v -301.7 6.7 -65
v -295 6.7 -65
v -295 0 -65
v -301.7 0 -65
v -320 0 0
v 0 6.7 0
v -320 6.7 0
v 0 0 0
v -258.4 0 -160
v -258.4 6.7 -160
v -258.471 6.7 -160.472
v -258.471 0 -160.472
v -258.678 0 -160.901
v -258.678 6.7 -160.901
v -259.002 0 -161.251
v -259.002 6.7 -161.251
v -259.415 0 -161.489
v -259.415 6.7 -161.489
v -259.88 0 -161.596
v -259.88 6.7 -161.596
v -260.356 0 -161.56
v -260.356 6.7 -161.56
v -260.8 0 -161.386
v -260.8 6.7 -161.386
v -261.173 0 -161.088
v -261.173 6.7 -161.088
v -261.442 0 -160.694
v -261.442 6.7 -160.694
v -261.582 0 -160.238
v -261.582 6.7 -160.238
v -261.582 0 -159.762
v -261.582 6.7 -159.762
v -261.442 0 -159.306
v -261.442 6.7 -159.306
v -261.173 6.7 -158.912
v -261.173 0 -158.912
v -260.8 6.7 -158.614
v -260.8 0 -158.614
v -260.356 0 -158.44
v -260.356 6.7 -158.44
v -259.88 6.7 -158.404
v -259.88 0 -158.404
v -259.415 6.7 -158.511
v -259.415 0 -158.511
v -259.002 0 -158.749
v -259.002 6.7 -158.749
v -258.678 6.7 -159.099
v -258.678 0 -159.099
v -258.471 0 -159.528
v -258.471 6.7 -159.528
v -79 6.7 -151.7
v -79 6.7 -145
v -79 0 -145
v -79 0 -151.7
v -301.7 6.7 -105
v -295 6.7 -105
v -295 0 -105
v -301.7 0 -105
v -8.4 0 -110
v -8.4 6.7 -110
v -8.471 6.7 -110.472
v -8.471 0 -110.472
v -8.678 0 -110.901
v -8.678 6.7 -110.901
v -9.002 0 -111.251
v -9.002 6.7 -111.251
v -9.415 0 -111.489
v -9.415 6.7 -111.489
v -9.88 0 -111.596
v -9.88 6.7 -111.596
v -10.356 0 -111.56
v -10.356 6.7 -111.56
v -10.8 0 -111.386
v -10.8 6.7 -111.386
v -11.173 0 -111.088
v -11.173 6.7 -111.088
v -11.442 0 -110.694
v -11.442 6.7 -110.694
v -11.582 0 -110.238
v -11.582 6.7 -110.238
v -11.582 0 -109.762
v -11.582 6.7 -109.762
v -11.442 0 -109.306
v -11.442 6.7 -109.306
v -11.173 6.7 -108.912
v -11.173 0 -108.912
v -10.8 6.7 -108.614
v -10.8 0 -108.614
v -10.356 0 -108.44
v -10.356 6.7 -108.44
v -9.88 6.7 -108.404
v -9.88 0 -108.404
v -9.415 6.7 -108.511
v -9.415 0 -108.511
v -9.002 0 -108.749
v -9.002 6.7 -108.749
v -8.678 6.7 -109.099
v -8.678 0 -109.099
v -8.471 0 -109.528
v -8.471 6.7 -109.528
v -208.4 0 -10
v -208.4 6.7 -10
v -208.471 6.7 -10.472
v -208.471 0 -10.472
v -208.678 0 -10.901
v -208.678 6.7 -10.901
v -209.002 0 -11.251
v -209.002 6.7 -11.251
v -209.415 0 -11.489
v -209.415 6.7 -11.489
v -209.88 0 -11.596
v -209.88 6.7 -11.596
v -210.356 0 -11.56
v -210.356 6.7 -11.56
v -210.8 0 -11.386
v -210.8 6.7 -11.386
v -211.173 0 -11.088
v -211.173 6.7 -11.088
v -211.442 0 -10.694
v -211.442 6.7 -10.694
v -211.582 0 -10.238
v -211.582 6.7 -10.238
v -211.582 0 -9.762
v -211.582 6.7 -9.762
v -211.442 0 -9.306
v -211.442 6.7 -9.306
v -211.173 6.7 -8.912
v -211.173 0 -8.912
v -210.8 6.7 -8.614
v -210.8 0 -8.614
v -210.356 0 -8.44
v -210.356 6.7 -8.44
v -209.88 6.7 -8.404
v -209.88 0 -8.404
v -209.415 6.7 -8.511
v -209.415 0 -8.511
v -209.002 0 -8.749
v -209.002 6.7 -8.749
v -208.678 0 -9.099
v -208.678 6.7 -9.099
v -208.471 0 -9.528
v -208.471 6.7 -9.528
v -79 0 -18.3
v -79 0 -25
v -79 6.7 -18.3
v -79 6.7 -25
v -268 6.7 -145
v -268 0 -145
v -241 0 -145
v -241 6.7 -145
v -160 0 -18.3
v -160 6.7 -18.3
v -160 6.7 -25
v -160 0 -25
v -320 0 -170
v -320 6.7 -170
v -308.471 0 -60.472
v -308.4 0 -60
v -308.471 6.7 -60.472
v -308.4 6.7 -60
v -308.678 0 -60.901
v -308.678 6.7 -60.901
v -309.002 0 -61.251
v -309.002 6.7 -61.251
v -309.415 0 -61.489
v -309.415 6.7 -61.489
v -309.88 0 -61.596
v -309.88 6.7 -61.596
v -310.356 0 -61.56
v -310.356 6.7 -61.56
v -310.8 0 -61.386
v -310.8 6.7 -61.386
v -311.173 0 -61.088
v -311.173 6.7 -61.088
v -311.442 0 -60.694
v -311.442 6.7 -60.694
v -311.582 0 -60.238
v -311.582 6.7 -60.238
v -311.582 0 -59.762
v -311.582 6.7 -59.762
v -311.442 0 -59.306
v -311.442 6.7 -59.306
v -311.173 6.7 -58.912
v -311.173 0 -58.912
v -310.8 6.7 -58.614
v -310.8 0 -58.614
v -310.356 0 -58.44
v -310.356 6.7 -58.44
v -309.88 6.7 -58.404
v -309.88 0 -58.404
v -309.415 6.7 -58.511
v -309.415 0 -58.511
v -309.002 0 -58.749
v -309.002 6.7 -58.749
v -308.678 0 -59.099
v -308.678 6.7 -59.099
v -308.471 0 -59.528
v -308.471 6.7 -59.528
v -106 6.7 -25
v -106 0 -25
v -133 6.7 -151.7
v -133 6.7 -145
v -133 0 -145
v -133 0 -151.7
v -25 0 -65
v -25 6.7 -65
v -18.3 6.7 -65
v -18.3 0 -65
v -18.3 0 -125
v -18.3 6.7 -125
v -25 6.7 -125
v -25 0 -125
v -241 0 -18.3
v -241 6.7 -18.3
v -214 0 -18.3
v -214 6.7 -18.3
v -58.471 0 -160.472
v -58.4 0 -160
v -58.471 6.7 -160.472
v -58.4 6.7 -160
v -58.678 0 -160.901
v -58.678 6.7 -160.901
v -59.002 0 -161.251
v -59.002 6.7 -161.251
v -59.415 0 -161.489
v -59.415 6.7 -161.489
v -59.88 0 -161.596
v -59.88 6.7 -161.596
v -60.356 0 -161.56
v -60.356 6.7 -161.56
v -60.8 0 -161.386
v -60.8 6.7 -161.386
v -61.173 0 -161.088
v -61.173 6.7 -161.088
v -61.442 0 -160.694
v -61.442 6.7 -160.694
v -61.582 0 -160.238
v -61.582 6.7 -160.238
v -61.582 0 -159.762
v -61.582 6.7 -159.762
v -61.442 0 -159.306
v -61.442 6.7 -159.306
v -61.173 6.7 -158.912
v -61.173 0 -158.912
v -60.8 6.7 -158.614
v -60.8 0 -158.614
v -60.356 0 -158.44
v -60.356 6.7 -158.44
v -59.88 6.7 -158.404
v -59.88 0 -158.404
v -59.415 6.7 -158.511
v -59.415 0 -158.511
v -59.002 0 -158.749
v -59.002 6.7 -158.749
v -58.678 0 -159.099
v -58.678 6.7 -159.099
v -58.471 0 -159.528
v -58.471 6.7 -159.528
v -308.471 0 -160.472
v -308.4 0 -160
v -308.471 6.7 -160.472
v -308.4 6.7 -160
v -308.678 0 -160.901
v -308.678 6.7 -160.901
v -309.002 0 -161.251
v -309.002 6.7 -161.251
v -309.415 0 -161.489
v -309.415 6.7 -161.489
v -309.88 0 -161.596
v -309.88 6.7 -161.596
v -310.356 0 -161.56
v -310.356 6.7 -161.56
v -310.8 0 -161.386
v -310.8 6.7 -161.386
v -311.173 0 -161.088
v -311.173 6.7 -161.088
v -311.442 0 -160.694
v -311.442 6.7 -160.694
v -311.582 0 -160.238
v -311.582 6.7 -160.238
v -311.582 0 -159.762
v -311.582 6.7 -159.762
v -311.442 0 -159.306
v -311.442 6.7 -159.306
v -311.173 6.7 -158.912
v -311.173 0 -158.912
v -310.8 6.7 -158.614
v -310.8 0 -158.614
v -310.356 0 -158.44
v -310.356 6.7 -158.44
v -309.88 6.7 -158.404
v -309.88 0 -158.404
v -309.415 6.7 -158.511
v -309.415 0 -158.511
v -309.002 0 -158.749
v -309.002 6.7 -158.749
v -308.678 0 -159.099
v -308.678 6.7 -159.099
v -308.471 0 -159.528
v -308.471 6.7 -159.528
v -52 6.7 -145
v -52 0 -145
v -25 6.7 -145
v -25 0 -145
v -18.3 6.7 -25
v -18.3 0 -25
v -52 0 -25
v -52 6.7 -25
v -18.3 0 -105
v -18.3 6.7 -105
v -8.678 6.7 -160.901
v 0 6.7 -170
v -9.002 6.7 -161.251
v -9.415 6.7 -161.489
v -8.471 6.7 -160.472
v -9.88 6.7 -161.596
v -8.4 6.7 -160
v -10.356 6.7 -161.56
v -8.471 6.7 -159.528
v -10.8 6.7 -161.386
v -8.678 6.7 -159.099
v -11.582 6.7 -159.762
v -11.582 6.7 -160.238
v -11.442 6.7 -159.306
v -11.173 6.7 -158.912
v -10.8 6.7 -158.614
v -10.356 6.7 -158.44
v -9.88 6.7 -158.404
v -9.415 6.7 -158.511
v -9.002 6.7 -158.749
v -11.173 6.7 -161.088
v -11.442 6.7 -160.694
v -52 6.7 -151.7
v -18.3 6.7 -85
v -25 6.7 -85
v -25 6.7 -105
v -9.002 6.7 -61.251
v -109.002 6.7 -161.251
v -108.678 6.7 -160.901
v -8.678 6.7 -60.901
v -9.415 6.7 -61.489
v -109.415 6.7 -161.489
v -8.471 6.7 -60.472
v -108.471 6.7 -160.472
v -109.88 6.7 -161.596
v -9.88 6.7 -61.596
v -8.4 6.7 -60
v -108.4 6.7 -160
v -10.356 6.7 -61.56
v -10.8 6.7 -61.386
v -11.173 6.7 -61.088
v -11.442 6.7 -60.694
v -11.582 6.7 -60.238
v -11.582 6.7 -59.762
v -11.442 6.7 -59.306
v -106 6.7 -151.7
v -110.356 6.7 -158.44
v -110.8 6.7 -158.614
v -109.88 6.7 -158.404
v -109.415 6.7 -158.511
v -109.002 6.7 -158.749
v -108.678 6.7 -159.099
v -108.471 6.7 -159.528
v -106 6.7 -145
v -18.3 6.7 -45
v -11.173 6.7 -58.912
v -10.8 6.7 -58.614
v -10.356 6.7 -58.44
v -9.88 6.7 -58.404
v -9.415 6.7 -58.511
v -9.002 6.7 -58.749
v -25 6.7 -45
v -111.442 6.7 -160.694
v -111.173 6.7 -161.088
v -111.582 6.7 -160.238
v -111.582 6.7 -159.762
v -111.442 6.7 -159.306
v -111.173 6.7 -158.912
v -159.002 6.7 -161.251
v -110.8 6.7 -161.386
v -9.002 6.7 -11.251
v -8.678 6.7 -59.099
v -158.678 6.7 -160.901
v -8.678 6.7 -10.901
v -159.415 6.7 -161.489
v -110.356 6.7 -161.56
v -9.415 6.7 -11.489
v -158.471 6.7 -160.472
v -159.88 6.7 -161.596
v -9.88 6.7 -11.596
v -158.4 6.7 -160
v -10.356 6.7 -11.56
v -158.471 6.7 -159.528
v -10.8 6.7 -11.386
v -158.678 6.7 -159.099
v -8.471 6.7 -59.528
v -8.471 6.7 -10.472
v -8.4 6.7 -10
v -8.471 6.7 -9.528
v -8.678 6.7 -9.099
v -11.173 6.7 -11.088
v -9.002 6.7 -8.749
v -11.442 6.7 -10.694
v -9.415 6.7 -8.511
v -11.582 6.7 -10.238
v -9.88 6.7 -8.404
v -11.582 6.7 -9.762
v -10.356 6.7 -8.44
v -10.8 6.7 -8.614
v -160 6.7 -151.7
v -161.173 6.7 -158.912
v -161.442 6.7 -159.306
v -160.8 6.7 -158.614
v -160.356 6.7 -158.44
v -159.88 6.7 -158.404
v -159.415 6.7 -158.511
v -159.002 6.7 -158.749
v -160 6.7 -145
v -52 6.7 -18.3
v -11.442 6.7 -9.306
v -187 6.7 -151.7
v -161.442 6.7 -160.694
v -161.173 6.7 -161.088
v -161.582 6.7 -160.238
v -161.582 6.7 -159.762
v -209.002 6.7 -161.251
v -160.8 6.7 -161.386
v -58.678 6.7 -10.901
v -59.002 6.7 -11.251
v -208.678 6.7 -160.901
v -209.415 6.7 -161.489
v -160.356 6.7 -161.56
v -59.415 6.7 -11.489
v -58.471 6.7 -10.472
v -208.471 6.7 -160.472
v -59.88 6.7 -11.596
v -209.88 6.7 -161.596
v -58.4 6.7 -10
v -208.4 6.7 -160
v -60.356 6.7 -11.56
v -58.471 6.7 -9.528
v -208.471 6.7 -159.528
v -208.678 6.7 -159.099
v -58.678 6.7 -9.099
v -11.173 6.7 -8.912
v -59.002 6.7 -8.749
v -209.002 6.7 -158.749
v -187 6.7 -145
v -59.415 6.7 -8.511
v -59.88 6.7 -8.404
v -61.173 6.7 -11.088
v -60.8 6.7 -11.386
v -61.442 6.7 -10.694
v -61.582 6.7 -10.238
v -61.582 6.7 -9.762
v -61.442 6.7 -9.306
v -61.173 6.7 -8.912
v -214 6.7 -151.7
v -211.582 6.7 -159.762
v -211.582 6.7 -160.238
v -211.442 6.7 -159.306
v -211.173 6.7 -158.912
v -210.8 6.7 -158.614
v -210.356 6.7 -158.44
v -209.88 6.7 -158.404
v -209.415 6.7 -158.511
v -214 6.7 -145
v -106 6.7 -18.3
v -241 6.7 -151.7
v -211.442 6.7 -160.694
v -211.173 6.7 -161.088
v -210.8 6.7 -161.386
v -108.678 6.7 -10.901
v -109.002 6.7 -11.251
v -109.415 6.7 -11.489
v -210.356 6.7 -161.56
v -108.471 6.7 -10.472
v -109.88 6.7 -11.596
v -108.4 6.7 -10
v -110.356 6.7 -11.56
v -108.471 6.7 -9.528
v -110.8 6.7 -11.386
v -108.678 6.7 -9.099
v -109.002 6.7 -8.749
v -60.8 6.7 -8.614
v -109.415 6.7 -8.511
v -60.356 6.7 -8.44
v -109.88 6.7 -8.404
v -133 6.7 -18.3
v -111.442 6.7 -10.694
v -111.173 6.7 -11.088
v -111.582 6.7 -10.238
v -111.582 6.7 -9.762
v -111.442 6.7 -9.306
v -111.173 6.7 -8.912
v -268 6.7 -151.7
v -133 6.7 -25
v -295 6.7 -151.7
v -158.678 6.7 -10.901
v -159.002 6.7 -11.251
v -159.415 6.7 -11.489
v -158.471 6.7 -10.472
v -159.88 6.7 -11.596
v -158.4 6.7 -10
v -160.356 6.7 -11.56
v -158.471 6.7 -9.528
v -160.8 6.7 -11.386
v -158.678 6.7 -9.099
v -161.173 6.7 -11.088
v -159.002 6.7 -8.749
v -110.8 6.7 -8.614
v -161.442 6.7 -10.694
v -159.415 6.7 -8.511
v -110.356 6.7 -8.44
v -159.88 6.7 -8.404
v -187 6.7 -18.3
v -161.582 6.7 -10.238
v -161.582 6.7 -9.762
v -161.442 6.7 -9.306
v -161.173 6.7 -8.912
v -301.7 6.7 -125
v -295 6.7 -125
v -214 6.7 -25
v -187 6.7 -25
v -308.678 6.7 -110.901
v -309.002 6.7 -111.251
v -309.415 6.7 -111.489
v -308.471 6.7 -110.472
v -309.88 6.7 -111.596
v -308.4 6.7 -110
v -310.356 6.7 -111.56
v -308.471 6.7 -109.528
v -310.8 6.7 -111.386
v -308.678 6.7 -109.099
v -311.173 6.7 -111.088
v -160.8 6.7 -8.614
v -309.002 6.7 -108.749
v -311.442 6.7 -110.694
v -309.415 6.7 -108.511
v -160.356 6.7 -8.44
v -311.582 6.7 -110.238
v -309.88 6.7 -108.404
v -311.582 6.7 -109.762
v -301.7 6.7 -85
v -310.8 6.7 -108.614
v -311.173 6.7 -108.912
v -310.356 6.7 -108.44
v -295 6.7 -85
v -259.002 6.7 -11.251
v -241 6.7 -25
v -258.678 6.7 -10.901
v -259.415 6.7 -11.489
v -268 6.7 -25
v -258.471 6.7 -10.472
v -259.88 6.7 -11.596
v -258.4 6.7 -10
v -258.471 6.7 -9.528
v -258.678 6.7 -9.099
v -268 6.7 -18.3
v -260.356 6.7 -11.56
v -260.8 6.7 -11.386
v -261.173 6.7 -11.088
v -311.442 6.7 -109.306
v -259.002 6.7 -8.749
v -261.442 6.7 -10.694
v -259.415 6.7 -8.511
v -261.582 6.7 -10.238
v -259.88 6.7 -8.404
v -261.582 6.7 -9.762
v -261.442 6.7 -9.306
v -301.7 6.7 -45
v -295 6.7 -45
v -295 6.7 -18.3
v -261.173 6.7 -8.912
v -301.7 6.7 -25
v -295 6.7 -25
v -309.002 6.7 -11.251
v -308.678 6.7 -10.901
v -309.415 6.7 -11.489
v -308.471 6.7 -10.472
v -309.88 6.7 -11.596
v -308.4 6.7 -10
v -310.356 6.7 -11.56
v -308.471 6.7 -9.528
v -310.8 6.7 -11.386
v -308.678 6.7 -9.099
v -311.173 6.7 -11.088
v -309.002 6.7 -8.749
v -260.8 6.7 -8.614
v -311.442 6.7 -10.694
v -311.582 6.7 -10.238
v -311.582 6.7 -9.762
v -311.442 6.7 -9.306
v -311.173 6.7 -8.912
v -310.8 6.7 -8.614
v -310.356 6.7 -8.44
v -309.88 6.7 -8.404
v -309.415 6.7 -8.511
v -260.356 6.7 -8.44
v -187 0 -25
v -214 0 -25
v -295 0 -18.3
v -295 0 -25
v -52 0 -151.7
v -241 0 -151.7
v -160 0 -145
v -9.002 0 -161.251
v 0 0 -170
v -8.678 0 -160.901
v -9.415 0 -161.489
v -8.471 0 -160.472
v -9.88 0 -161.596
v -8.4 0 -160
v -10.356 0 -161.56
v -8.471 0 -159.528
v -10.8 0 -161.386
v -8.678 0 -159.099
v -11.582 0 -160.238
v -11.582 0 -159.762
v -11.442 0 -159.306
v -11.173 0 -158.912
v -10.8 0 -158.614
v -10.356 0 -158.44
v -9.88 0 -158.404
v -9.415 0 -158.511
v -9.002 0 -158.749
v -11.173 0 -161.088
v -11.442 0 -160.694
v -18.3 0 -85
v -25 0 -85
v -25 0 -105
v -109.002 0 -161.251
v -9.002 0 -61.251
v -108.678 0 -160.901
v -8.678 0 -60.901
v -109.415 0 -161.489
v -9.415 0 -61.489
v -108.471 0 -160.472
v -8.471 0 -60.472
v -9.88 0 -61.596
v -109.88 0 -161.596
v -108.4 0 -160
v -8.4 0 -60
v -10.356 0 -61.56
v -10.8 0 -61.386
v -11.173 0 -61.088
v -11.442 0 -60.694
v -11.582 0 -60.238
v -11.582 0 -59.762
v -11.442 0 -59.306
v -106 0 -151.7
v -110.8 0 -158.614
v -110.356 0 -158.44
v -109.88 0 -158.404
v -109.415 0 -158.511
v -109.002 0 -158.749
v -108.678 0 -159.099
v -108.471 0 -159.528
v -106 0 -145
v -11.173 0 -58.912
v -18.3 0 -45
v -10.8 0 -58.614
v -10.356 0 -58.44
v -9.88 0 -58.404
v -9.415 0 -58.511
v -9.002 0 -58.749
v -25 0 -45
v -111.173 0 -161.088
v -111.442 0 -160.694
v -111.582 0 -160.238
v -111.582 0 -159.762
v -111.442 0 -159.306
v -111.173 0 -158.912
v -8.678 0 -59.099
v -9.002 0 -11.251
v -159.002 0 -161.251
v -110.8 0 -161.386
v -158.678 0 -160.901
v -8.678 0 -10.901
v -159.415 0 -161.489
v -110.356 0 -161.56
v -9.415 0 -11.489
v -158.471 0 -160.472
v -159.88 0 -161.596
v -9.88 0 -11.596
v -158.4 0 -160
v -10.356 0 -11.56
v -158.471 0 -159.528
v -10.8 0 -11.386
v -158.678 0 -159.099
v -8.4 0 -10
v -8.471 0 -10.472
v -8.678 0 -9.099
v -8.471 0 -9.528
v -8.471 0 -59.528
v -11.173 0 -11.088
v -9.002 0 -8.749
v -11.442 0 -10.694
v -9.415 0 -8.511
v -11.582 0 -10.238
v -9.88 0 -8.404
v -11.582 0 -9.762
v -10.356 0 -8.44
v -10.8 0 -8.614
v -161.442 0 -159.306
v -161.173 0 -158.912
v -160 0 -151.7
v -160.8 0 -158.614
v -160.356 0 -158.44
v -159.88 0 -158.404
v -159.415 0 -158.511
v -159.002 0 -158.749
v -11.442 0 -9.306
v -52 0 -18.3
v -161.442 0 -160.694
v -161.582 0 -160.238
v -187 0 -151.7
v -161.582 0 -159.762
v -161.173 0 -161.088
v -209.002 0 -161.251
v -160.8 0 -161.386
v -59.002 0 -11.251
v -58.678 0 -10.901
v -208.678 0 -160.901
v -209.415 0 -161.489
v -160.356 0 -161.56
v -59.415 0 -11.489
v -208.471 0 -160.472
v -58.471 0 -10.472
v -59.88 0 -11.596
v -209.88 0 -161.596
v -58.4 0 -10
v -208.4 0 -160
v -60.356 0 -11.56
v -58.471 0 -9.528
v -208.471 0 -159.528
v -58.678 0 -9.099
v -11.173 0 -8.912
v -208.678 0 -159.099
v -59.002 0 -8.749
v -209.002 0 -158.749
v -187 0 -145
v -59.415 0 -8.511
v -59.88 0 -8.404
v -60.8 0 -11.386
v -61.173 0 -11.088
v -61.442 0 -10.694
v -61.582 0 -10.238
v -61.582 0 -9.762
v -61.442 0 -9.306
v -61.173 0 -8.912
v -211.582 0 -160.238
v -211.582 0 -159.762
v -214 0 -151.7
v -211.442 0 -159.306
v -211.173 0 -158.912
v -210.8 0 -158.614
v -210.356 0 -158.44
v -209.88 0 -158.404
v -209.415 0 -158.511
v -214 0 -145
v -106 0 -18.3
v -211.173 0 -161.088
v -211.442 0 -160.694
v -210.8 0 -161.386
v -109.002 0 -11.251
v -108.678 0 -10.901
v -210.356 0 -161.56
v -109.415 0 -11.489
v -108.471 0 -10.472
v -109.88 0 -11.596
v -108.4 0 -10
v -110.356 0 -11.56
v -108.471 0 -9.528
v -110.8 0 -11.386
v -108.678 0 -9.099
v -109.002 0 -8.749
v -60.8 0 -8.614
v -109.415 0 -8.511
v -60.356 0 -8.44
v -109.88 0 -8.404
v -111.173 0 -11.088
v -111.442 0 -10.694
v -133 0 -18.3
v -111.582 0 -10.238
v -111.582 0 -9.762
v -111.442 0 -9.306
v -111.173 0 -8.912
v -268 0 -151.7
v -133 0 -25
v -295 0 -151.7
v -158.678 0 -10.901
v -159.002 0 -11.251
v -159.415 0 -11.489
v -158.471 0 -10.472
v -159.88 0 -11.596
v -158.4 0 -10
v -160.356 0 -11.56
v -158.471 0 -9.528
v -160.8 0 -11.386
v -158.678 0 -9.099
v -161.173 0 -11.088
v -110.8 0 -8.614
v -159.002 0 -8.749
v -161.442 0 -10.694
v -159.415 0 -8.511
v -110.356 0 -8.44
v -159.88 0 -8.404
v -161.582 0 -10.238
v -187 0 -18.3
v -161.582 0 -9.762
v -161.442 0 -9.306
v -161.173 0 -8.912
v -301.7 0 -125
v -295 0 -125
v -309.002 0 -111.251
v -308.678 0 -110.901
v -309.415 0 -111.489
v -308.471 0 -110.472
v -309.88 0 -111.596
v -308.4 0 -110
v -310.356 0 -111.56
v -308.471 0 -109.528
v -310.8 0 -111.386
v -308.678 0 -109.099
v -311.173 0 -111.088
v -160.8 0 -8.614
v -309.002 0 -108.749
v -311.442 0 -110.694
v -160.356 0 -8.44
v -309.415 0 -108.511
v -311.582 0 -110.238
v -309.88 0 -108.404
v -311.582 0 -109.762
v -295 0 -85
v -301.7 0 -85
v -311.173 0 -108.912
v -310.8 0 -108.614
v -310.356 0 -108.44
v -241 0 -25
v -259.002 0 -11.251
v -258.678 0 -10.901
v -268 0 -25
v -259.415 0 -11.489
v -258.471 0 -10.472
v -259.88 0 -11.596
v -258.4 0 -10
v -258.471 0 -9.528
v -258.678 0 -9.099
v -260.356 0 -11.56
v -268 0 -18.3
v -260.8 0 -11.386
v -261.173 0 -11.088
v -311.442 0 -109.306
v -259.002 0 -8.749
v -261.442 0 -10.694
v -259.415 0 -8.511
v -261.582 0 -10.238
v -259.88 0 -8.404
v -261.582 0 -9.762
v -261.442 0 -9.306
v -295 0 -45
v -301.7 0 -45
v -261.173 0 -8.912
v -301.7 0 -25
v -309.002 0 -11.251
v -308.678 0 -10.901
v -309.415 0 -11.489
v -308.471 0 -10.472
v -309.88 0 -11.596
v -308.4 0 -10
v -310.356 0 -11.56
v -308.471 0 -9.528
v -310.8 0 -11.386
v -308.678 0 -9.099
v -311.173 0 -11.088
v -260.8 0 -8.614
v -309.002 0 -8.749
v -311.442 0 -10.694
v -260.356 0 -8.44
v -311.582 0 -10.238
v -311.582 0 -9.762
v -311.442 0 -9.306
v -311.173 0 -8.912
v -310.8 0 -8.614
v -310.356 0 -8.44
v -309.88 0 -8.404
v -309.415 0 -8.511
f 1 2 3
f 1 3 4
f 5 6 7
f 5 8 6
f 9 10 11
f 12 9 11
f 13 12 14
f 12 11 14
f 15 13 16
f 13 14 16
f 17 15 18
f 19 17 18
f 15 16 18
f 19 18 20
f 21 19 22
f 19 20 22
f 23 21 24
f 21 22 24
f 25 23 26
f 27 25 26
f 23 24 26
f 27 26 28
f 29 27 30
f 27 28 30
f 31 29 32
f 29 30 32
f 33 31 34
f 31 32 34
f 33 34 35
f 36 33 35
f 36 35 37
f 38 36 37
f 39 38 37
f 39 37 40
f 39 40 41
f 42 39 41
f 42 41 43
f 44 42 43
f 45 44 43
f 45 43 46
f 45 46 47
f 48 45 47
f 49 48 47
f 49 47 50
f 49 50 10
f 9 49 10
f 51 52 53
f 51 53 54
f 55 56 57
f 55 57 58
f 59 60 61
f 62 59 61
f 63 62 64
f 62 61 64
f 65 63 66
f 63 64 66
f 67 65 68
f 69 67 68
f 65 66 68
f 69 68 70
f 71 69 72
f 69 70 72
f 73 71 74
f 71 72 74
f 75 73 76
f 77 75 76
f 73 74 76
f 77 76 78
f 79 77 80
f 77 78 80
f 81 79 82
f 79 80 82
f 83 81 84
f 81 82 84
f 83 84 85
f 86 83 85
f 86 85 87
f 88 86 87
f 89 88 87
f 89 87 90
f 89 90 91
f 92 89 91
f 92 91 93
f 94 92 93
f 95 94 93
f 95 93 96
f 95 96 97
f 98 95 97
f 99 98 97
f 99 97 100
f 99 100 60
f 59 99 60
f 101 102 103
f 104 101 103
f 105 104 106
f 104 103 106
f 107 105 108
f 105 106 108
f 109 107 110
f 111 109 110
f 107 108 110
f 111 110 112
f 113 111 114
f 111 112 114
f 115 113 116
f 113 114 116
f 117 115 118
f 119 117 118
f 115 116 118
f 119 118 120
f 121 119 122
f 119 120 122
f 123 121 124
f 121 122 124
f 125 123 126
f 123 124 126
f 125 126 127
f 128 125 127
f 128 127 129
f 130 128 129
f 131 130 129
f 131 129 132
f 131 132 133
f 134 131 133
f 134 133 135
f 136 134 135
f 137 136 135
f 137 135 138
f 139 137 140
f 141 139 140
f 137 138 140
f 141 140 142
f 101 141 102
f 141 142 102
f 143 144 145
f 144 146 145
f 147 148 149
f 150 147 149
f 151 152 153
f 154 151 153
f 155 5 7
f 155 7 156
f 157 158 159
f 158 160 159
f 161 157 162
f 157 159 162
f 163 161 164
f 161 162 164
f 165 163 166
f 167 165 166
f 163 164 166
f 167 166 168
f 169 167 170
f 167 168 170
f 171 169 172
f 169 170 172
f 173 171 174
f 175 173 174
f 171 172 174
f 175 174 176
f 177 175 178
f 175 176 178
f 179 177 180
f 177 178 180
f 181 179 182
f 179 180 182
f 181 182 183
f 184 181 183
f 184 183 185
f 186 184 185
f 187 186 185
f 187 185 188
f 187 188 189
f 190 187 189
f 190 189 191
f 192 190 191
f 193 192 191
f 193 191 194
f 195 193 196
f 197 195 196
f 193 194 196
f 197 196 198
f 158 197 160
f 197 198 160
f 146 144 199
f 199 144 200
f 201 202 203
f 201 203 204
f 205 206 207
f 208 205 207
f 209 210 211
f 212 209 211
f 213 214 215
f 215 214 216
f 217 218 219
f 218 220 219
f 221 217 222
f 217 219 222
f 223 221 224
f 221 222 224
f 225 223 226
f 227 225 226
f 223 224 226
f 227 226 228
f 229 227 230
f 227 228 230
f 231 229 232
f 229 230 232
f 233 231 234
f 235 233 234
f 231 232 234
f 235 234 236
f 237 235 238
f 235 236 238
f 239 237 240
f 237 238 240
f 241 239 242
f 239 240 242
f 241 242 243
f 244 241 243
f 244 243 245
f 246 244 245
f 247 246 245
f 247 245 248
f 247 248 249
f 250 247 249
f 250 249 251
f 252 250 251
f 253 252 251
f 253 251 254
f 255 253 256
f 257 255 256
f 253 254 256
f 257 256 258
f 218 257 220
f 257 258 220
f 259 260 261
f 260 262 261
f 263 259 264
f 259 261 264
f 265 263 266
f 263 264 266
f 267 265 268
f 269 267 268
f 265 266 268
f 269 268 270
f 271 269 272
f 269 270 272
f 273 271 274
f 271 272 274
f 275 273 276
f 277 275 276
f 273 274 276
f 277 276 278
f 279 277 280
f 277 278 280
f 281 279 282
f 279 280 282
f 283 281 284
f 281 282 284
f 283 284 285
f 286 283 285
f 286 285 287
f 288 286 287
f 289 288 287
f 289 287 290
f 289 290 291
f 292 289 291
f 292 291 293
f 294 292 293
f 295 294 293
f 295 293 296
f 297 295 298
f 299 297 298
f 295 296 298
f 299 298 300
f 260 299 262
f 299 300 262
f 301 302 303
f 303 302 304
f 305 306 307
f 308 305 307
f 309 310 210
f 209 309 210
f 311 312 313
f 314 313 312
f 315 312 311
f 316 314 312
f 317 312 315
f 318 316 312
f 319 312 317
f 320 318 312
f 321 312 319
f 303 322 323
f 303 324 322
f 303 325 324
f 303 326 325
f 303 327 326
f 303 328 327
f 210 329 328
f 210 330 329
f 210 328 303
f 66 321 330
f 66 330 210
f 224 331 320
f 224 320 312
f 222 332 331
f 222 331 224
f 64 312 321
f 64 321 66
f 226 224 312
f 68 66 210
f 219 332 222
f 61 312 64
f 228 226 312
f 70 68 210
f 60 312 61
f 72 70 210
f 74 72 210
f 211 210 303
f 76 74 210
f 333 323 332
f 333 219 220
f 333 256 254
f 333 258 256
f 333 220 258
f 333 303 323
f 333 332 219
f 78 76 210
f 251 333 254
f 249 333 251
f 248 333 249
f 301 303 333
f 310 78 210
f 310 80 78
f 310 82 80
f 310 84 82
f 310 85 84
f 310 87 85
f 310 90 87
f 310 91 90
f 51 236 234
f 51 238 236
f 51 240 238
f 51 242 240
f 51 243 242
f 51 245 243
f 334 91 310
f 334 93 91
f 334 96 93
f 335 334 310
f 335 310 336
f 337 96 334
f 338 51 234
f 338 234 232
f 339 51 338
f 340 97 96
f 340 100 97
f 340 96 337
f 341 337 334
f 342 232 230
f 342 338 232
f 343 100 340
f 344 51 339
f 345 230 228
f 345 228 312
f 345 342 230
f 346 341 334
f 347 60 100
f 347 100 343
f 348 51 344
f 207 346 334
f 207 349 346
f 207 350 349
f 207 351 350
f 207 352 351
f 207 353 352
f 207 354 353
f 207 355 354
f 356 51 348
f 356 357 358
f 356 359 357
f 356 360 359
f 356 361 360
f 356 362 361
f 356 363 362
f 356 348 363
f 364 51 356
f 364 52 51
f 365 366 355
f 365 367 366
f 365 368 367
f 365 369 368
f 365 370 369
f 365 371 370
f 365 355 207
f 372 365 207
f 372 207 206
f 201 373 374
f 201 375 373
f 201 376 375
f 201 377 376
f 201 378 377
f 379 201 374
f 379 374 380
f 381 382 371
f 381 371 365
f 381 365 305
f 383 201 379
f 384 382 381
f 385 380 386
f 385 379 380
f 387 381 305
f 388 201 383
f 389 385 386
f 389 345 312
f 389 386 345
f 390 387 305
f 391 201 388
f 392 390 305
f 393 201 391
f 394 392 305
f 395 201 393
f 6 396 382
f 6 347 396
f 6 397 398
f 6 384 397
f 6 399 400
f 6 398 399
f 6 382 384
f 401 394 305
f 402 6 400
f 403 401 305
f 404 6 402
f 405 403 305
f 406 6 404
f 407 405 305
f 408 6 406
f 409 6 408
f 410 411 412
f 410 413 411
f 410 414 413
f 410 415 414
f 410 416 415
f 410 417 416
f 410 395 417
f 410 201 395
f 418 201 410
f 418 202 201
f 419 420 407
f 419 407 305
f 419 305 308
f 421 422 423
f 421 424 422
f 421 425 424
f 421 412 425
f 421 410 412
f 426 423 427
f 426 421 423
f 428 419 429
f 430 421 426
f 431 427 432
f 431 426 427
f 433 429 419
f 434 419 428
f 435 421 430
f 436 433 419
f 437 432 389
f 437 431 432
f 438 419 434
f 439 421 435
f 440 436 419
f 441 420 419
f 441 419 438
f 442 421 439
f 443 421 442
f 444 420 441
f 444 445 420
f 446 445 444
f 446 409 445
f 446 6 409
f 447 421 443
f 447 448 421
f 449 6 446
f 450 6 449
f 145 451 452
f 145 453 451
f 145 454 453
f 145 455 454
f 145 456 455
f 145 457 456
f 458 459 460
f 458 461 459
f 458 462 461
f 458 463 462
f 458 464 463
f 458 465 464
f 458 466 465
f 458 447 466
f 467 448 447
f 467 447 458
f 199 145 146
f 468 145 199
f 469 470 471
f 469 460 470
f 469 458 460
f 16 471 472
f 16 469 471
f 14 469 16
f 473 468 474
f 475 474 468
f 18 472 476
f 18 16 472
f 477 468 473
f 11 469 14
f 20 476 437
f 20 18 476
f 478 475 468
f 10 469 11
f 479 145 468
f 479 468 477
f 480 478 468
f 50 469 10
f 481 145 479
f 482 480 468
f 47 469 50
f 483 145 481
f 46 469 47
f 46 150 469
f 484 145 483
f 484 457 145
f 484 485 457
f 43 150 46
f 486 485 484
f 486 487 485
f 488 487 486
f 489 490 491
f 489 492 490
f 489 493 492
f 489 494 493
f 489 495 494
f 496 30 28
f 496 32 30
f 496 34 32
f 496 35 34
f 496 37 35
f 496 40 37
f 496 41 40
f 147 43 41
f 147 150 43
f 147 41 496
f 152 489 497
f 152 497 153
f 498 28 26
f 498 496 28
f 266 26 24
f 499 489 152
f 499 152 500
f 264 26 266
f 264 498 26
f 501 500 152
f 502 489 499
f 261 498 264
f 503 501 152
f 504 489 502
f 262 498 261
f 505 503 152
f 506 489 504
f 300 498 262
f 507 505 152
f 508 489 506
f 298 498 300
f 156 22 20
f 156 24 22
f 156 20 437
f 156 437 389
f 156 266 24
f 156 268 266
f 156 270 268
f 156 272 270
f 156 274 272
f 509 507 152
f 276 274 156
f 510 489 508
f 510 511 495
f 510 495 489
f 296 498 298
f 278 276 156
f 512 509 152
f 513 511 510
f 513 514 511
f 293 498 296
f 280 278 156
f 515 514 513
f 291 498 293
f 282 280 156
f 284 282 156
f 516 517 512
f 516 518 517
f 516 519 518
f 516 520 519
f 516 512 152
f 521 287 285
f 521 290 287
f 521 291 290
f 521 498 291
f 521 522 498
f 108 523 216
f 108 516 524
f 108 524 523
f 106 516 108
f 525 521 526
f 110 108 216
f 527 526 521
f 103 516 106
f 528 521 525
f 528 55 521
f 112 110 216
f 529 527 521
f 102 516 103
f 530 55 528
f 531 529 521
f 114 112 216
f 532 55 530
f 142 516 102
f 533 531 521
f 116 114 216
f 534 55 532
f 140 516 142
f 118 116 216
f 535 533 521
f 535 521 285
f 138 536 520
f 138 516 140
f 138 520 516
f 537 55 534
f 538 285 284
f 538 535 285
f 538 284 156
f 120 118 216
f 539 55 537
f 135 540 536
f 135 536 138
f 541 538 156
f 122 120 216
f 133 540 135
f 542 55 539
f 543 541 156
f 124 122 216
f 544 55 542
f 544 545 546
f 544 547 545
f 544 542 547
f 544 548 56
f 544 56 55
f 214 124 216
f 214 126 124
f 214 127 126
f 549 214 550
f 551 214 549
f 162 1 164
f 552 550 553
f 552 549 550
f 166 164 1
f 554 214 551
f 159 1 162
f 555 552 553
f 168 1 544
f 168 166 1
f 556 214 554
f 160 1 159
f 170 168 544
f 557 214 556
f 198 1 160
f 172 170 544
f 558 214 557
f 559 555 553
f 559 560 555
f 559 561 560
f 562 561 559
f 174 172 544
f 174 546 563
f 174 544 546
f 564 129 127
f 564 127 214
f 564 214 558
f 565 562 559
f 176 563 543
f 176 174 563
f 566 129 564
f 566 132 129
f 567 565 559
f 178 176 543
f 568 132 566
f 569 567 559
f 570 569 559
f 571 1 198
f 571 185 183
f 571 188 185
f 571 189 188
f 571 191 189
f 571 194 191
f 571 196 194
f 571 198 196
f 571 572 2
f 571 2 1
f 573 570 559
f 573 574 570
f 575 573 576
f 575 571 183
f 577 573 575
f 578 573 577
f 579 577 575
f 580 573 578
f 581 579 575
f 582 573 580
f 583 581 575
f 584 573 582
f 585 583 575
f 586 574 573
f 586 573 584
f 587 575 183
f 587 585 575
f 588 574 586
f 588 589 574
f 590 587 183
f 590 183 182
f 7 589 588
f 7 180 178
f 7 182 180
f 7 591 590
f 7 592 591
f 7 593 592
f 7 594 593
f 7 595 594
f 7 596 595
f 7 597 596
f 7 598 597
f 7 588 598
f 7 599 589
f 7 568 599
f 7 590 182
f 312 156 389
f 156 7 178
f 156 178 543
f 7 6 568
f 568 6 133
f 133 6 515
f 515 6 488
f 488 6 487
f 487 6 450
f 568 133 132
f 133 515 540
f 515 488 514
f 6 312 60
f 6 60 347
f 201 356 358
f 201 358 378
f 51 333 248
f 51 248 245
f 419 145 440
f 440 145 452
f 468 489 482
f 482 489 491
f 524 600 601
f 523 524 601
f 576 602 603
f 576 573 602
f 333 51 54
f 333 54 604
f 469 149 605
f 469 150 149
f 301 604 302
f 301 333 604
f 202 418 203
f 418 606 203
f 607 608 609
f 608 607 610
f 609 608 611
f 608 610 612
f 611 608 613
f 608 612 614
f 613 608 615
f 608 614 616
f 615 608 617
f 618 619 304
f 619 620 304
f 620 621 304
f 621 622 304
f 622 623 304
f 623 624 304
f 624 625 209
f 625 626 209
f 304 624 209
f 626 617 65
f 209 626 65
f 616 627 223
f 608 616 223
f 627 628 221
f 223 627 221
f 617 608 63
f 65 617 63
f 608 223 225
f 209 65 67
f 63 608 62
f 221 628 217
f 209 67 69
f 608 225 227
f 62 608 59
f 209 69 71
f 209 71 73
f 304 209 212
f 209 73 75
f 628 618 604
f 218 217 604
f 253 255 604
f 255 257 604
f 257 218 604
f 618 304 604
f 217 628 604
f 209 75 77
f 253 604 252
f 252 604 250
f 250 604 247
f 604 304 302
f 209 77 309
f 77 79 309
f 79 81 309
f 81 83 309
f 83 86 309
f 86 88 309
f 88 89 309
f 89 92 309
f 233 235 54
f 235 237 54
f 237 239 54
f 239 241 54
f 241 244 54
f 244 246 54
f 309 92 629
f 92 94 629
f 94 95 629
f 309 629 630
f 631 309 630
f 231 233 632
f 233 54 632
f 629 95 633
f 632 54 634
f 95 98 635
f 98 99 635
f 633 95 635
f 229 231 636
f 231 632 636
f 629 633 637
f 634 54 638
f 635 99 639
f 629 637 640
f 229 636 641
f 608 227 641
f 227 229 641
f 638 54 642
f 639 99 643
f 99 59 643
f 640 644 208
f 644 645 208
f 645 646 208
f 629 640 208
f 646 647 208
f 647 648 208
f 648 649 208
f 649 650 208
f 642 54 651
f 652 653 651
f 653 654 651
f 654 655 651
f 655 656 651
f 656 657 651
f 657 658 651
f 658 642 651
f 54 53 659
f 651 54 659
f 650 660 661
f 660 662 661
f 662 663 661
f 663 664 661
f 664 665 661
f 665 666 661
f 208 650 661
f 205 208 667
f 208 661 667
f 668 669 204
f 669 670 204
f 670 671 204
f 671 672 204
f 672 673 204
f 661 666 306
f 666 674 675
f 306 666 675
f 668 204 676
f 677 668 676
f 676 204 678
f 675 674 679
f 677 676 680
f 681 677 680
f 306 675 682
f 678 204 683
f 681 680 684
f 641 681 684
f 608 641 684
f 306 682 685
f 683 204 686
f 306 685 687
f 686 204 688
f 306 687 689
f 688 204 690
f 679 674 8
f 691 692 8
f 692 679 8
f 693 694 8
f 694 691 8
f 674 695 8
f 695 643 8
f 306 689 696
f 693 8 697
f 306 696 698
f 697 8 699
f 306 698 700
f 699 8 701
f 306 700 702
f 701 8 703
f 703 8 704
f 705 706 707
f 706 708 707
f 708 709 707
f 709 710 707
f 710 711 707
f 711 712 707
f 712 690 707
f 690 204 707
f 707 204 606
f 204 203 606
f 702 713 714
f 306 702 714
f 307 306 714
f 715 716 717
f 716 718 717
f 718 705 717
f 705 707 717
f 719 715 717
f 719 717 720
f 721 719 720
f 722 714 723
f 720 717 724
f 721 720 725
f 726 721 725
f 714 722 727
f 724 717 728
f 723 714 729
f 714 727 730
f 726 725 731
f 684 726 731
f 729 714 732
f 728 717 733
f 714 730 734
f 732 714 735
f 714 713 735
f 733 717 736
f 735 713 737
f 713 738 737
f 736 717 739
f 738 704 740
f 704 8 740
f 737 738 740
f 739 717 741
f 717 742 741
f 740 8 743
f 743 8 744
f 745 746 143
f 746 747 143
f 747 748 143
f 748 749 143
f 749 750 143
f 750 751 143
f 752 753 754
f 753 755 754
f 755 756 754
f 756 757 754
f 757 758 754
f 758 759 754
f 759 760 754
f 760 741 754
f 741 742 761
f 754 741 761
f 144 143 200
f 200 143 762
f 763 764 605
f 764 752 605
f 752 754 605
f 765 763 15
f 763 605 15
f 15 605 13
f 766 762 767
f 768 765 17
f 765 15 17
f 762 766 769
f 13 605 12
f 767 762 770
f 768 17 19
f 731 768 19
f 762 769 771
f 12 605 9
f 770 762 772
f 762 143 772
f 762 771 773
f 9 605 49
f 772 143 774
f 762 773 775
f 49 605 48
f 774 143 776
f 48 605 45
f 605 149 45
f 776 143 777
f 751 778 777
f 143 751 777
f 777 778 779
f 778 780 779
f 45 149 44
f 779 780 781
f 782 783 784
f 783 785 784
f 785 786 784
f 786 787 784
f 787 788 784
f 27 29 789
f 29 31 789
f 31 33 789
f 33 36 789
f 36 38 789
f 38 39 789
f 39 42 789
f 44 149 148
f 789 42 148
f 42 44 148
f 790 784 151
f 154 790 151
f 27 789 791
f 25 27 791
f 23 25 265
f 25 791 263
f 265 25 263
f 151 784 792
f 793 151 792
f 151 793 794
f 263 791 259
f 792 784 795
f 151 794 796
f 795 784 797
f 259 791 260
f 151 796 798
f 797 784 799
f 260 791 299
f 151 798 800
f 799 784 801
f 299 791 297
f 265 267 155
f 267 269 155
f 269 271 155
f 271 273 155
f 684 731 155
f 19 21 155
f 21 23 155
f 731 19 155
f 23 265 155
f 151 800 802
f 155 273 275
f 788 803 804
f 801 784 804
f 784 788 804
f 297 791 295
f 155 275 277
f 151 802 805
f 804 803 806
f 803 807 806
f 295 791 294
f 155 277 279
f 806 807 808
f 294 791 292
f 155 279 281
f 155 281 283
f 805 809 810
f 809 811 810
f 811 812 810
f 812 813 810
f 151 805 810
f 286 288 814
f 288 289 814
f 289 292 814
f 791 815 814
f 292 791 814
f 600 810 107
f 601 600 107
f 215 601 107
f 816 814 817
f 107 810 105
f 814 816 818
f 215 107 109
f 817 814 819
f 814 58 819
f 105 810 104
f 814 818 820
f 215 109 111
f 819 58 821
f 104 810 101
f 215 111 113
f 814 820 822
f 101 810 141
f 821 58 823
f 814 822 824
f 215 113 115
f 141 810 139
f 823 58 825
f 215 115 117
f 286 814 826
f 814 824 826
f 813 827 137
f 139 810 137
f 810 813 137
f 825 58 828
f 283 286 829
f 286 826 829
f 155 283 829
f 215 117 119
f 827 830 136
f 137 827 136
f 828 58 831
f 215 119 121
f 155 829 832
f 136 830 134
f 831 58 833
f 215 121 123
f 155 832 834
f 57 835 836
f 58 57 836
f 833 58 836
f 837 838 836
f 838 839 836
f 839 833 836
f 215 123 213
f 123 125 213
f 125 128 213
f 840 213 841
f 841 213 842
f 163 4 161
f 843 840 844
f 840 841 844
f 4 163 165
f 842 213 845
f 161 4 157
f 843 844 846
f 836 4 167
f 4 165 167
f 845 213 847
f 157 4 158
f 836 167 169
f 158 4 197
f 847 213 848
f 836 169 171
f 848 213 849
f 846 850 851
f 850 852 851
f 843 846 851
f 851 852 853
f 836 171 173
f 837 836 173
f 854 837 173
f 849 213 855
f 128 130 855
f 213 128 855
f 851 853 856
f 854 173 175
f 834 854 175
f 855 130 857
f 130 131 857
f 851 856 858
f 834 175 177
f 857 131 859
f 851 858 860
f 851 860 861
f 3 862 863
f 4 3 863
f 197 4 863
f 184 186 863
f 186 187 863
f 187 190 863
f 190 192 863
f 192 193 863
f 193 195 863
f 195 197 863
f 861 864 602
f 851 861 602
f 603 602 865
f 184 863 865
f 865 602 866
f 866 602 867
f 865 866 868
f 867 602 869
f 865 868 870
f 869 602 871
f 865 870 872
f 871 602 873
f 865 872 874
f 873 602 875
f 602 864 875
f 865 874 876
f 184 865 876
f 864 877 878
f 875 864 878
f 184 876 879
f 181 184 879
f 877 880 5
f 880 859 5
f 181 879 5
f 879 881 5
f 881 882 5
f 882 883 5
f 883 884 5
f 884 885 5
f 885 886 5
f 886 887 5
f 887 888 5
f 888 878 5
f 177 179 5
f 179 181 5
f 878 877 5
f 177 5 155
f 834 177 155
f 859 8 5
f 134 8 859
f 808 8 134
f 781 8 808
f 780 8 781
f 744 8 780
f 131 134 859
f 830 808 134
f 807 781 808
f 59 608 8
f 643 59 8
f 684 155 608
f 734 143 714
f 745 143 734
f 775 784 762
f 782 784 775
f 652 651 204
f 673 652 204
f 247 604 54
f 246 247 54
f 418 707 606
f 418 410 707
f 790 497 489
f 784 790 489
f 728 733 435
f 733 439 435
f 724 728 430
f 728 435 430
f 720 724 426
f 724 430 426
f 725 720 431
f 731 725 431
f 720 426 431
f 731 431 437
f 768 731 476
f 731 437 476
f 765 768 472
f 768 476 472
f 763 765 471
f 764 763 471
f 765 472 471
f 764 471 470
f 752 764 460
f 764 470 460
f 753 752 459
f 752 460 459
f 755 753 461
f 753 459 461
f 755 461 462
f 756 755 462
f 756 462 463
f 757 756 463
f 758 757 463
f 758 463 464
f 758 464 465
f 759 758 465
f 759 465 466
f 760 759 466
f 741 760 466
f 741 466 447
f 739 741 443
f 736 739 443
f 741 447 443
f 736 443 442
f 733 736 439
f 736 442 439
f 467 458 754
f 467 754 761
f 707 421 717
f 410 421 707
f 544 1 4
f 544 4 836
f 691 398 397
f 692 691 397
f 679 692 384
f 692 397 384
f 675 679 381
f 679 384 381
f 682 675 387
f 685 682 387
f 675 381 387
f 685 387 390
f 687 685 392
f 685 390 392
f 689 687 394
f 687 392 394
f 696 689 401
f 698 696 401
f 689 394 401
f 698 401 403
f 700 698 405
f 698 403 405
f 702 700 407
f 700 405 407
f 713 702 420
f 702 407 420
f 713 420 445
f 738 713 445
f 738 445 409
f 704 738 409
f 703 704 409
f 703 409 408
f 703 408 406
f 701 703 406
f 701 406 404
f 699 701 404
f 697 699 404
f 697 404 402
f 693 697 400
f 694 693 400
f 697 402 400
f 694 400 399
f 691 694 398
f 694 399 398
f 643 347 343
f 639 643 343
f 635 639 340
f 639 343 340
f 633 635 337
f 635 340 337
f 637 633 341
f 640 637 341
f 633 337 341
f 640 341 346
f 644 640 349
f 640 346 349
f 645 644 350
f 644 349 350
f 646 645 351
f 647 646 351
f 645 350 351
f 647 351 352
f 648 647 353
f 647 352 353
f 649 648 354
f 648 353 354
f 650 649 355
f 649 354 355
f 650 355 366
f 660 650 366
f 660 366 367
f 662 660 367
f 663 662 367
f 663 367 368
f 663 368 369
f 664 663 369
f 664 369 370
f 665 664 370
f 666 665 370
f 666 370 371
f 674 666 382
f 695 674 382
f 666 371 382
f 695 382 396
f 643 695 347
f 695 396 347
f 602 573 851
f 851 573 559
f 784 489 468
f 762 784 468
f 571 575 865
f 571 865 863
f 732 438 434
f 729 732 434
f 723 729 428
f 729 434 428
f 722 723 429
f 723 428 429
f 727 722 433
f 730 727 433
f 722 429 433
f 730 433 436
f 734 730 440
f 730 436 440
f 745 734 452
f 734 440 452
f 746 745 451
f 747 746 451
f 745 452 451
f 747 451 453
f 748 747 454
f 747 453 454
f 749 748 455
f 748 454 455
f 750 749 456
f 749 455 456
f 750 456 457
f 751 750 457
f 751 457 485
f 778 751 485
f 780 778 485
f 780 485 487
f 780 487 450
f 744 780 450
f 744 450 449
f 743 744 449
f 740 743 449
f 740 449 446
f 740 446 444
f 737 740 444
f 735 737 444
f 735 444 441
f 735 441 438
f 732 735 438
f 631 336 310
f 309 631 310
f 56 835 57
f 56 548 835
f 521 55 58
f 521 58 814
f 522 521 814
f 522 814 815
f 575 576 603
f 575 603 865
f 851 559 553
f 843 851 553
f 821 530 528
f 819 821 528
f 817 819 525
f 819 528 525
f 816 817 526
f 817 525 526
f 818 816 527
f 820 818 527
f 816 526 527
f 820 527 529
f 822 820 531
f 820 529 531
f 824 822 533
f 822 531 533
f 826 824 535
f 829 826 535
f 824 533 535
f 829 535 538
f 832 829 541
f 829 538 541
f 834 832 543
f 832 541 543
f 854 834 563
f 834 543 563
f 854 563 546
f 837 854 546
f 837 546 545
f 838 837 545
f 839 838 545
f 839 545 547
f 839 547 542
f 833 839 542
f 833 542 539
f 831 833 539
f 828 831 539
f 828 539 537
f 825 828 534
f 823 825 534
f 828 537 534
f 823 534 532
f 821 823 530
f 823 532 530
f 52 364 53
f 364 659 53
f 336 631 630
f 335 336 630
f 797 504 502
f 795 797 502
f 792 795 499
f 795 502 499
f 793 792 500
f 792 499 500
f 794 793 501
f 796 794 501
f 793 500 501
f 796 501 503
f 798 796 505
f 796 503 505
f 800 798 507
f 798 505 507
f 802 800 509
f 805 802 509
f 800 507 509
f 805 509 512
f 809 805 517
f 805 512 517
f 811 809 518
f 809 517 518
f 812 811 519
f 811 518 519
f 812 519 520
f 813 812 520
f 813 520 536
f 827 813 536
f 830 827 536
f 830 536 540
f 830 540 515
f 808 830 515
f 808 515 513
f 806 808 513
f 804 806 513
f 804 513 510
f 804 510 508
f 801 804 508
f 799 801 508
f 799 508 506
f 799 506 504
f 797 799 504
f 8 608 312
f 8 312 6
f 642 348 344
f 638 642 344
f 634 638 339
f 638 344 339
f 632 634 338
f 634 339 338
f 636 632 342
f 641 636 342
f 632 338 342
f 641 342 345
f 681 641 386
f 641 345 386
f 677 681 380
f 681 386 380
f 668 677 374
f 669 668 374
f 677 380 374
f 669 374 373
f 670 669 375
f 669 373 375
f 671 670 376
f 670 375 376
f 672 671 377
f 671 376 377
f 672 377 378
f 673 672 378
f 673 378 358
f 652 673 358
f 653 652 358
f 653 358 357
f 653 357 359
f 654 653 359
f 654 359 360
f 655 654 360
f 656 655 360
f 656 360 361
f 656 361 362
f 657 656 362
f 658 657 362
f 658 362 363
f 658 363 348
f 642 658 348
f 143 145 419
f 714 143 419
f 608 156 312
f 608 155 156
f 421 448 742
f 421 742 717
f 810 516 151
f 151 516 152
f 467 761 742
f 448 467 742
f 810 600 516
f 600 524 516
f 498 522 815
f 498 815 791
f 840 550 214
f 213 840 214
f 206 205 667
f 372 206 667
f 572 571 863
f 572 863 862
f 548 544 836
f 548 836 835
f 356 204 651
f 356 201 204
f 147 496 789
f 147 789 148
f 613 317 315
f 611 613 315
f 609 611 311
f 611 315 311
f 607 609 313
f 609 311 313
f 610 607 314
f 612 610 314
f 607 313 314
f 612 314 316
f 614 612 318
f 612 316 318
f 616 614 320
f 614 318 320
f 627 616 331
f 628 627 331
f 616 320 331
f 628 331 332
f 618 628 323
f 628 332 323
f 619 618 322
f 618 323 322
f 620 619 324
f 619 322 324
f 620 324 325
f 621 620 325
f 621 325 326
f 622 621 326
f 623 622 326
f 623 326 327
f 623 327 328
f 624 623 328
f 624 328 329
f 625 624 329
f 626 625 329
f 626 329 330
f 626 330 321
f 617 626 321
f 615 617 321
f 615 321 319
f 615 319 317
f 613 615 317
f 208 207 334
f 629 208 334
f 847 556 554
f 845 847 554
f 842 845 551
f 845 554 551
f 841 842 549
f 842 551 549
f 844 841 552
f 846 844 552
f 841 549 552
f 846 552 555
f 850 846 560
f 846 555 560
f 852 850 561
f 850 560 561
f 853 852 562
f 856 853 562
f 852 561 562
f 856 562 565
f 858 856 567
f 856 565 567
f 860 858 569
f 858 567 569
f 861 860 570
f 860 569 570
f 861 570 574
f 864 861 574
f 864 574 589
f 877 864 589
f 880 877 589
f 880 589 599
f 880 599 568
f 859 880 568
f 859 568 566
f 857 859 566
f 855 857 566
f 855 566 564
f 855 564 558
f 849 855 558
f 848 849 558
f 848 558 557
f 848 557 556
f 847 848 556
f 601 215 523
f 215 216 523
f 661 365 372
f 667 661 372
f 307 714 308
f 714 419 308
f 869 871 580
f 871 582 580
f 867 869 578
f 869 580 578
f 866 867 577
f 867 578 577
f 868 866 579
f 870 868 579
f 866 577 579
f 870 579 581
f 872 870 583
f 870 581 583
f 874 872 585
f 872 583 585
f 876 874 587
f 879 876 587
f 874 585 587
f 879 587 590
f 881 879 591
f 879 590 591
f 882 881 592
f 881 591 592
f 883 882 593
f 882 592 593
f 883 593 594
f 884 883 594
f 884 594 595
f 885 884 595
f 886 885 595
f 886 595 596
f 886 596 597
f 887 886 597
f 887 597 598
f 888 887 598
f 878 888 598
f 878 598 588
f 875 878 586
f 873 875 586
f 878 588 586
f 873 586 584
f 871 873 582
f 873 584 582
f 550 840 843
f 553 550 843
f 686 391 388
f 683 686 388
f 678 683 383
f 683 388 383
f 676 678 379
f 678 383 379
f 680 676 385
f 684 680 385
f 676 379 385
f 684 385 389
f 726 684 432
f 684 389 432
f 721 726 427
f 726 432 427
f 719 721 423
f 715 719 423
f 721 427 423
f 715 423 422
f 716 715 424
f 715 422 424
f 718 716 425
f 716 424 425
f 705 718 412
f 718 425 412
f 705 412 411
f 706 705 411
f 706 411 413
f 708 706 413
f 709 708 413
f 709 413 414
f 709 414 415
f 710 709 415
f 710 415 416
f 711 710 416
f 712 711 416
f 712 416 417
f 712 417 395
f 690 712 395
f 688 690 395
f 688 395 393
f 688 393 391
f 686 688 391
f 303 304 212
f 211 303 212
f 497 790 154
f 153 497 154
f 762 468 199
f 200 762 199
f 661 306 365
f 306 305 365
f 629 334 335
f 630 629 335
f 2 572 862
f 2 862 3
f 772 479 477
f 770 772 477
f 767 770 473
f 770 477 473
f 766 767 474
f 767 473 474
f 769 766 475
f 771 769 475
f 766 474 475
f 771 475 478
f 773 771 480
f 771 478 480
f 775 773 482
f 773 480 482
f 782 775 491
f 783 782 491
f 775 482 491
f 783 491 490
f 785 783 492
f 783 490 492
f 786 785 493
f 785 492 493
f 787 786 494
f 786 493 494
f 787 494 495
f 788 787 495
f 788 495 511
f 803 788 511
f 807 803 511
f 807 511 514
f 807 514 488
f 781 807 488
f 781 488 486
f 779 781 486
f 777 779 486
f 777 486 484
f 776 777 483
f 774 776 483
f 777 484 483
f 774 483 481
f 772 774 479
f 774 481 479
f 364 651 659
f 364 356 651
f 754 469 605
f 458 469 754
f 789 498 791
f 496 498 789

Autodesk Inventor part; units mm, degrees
ref_plane "YZ Plane" through (0, 0, 0) normal (1, 0, 0) x (0, 1, 0)
ref_plane "XZ Plane" through (0, 0, 0) normal (0, 1, 0) x (-1, 0, 0)
ref_plane "XY Plane" through (0, 0, 0) normal (0, 0, 1) x (1, 0, 0)
sketch "Sketch1" plane through (0, 0, 0) normal (0, 1, 0) x (-1, 0, 0)
  line L0 (0, 0) -> (320, 0)
  line L1 (320, 0) -> (320, -170)
  line L2 (320, -170) -> (0, -170)
  line L3 (0, -170) -> (0, 0)
  line L4 (0, 0) -> (25, 0)
  line L5 (25, -25) -> (295, -25)
  line L6 (295, -25) -> (295, -145)
  line L7 (295, -145) -> (25, -145)
  line L8 (25, -145) -> (25, -25)
  dimension "d0" = 320
  dimension "d1" = 170
  dimension "d2" = 25
  dimension "d3" = 25
  dimension "d4" = 270
  dimension "d5" = 120
extrude "Extrusion1" add sketch "Sketch1" along normal blind 6.7
sketch "Sketch2" plane through (0, 6.7, 0) normal (0, 1, 0) x (1, 0, 0)
  line L0 (-320, 0) -> (0, 0) projected
  line L1 (0, 0) -> (0, 170) projected
  circle A0 centre (-10, 10) radius 1.6
  line L2 (0, 170) -> (0, 160)
  circle A1 centre (-10, 160) radius 1.6
  dimension "d10" = 3.2
  dimension "d13" = 3.2
extrude "Extrusion2" cut sketch "Sketch2" against normal blind 6.7
pattern_linear "Rectangular Pattern1" count 7 spacing 50 along (-1, 0, 0) of "Extrusion2"
sketch "Sketch3" plane through (0, 6.7, 0) normal (0, 1, 0) x (1, 0, 0)
  circle A0 centre (-310, 10) radius 1.6 projected
  circle A1 centre (-310, 60) radius 1.6
  circle A2 centre (-10, 10) radius 1.6 projected
  circle A3 centre (-10, 60) radius 1.6
  point P0 (0, 0)
  dimension "d20" = 3.2
  dimension "d22" = 3.2
extrude "Extrusion3" cut sketch "Sketch3" against normal blind 6.7 contours A1 | A3
pattern_linear "Rectangular Pattern2" count 2 spacing 50 along (0, 0, -1) of "Extrusion3"
sketch "Sketch4" plane through (0, 6.7, 0) normal (0, 1, 0) x (1, 0, 0)
  line L0 (-25, 25) -> (-25, 145) projected
  line L1 (-25, 25) -> (-295, 25) projected
  line L2 (-52, 25) -> (-79, 25)
  line L3 (-79, 25) -> (-79, 18.3)
  line L4 (-79, 18.3) -> (-52, 18.3)
  line L5 (-52, 18.3) -> (-52, 25)
  line L6 (-295, 145) -> (-25, 145) projected
  line L7 (-25, 145) -> (-52, 145)
  line L8 (-52, 145) -> (-79, 145)
  line L9 (-79, 145) -> (-79, 151.7)
  line L10 (-79, 151.7) -> (-52, 151.7)
  line L11 (-52, 151.7) -> (-52, 145)
  point P0 (0, 0)
  dimension "d28" = 27
  dimension "d29" = 27
  dimension "d30" = 6.7
  dimension "d31" = 27
  dimension "d32" = 27
  dimension "d33" = 6.7
extrude "Extrusion4" cut sketch "Sketch4" against normal blind 6.7
pattern_linear "Rectangular Pattern3" count 5 spacing 54 along (-1, 0, 0) of "Extrusion4"
sketch "Sketch5" plane through (0, 6.7, 0) normal (0, 1, 0) x (1, 0, 0)
  line L0 (-25, 145) -> (-25, 25) projected
  line L1 (-25, 25) -> (-18.3, 25)
  line L2 (-18.3, 25) -> (-18.3, 45)
  line L3 (-18.3, 45) -> (-25, 45)
  line L4 (-25, 45) -> (-25, 25)
  line L5 (-295, 18.3) -> (-295, 151.7) projected
  line L6 (-295, 25) -> (-301.7, 25)
  line L7 (-301.7, 25) -> (-301.7, 45)
  line L8 (-301.7, 45) -> (-295, 45)
  line L9 (-295, 45) -> (-295, 25)
  point P0 (0, 0)
  dimension "d39" = 6.7
  dimension "d40" = 20
  dimension "d41" = 6.7
  dimension "d42" = 20
extrude "Extrusion5" cut sketch "Sketch5" against normal blind 6.7
pattern_linear "Rectangular Pattern4" count 3 spacing 40 along (0, 0, -1) of "Extrusion5"
properties part number "b_Base_support 1"
